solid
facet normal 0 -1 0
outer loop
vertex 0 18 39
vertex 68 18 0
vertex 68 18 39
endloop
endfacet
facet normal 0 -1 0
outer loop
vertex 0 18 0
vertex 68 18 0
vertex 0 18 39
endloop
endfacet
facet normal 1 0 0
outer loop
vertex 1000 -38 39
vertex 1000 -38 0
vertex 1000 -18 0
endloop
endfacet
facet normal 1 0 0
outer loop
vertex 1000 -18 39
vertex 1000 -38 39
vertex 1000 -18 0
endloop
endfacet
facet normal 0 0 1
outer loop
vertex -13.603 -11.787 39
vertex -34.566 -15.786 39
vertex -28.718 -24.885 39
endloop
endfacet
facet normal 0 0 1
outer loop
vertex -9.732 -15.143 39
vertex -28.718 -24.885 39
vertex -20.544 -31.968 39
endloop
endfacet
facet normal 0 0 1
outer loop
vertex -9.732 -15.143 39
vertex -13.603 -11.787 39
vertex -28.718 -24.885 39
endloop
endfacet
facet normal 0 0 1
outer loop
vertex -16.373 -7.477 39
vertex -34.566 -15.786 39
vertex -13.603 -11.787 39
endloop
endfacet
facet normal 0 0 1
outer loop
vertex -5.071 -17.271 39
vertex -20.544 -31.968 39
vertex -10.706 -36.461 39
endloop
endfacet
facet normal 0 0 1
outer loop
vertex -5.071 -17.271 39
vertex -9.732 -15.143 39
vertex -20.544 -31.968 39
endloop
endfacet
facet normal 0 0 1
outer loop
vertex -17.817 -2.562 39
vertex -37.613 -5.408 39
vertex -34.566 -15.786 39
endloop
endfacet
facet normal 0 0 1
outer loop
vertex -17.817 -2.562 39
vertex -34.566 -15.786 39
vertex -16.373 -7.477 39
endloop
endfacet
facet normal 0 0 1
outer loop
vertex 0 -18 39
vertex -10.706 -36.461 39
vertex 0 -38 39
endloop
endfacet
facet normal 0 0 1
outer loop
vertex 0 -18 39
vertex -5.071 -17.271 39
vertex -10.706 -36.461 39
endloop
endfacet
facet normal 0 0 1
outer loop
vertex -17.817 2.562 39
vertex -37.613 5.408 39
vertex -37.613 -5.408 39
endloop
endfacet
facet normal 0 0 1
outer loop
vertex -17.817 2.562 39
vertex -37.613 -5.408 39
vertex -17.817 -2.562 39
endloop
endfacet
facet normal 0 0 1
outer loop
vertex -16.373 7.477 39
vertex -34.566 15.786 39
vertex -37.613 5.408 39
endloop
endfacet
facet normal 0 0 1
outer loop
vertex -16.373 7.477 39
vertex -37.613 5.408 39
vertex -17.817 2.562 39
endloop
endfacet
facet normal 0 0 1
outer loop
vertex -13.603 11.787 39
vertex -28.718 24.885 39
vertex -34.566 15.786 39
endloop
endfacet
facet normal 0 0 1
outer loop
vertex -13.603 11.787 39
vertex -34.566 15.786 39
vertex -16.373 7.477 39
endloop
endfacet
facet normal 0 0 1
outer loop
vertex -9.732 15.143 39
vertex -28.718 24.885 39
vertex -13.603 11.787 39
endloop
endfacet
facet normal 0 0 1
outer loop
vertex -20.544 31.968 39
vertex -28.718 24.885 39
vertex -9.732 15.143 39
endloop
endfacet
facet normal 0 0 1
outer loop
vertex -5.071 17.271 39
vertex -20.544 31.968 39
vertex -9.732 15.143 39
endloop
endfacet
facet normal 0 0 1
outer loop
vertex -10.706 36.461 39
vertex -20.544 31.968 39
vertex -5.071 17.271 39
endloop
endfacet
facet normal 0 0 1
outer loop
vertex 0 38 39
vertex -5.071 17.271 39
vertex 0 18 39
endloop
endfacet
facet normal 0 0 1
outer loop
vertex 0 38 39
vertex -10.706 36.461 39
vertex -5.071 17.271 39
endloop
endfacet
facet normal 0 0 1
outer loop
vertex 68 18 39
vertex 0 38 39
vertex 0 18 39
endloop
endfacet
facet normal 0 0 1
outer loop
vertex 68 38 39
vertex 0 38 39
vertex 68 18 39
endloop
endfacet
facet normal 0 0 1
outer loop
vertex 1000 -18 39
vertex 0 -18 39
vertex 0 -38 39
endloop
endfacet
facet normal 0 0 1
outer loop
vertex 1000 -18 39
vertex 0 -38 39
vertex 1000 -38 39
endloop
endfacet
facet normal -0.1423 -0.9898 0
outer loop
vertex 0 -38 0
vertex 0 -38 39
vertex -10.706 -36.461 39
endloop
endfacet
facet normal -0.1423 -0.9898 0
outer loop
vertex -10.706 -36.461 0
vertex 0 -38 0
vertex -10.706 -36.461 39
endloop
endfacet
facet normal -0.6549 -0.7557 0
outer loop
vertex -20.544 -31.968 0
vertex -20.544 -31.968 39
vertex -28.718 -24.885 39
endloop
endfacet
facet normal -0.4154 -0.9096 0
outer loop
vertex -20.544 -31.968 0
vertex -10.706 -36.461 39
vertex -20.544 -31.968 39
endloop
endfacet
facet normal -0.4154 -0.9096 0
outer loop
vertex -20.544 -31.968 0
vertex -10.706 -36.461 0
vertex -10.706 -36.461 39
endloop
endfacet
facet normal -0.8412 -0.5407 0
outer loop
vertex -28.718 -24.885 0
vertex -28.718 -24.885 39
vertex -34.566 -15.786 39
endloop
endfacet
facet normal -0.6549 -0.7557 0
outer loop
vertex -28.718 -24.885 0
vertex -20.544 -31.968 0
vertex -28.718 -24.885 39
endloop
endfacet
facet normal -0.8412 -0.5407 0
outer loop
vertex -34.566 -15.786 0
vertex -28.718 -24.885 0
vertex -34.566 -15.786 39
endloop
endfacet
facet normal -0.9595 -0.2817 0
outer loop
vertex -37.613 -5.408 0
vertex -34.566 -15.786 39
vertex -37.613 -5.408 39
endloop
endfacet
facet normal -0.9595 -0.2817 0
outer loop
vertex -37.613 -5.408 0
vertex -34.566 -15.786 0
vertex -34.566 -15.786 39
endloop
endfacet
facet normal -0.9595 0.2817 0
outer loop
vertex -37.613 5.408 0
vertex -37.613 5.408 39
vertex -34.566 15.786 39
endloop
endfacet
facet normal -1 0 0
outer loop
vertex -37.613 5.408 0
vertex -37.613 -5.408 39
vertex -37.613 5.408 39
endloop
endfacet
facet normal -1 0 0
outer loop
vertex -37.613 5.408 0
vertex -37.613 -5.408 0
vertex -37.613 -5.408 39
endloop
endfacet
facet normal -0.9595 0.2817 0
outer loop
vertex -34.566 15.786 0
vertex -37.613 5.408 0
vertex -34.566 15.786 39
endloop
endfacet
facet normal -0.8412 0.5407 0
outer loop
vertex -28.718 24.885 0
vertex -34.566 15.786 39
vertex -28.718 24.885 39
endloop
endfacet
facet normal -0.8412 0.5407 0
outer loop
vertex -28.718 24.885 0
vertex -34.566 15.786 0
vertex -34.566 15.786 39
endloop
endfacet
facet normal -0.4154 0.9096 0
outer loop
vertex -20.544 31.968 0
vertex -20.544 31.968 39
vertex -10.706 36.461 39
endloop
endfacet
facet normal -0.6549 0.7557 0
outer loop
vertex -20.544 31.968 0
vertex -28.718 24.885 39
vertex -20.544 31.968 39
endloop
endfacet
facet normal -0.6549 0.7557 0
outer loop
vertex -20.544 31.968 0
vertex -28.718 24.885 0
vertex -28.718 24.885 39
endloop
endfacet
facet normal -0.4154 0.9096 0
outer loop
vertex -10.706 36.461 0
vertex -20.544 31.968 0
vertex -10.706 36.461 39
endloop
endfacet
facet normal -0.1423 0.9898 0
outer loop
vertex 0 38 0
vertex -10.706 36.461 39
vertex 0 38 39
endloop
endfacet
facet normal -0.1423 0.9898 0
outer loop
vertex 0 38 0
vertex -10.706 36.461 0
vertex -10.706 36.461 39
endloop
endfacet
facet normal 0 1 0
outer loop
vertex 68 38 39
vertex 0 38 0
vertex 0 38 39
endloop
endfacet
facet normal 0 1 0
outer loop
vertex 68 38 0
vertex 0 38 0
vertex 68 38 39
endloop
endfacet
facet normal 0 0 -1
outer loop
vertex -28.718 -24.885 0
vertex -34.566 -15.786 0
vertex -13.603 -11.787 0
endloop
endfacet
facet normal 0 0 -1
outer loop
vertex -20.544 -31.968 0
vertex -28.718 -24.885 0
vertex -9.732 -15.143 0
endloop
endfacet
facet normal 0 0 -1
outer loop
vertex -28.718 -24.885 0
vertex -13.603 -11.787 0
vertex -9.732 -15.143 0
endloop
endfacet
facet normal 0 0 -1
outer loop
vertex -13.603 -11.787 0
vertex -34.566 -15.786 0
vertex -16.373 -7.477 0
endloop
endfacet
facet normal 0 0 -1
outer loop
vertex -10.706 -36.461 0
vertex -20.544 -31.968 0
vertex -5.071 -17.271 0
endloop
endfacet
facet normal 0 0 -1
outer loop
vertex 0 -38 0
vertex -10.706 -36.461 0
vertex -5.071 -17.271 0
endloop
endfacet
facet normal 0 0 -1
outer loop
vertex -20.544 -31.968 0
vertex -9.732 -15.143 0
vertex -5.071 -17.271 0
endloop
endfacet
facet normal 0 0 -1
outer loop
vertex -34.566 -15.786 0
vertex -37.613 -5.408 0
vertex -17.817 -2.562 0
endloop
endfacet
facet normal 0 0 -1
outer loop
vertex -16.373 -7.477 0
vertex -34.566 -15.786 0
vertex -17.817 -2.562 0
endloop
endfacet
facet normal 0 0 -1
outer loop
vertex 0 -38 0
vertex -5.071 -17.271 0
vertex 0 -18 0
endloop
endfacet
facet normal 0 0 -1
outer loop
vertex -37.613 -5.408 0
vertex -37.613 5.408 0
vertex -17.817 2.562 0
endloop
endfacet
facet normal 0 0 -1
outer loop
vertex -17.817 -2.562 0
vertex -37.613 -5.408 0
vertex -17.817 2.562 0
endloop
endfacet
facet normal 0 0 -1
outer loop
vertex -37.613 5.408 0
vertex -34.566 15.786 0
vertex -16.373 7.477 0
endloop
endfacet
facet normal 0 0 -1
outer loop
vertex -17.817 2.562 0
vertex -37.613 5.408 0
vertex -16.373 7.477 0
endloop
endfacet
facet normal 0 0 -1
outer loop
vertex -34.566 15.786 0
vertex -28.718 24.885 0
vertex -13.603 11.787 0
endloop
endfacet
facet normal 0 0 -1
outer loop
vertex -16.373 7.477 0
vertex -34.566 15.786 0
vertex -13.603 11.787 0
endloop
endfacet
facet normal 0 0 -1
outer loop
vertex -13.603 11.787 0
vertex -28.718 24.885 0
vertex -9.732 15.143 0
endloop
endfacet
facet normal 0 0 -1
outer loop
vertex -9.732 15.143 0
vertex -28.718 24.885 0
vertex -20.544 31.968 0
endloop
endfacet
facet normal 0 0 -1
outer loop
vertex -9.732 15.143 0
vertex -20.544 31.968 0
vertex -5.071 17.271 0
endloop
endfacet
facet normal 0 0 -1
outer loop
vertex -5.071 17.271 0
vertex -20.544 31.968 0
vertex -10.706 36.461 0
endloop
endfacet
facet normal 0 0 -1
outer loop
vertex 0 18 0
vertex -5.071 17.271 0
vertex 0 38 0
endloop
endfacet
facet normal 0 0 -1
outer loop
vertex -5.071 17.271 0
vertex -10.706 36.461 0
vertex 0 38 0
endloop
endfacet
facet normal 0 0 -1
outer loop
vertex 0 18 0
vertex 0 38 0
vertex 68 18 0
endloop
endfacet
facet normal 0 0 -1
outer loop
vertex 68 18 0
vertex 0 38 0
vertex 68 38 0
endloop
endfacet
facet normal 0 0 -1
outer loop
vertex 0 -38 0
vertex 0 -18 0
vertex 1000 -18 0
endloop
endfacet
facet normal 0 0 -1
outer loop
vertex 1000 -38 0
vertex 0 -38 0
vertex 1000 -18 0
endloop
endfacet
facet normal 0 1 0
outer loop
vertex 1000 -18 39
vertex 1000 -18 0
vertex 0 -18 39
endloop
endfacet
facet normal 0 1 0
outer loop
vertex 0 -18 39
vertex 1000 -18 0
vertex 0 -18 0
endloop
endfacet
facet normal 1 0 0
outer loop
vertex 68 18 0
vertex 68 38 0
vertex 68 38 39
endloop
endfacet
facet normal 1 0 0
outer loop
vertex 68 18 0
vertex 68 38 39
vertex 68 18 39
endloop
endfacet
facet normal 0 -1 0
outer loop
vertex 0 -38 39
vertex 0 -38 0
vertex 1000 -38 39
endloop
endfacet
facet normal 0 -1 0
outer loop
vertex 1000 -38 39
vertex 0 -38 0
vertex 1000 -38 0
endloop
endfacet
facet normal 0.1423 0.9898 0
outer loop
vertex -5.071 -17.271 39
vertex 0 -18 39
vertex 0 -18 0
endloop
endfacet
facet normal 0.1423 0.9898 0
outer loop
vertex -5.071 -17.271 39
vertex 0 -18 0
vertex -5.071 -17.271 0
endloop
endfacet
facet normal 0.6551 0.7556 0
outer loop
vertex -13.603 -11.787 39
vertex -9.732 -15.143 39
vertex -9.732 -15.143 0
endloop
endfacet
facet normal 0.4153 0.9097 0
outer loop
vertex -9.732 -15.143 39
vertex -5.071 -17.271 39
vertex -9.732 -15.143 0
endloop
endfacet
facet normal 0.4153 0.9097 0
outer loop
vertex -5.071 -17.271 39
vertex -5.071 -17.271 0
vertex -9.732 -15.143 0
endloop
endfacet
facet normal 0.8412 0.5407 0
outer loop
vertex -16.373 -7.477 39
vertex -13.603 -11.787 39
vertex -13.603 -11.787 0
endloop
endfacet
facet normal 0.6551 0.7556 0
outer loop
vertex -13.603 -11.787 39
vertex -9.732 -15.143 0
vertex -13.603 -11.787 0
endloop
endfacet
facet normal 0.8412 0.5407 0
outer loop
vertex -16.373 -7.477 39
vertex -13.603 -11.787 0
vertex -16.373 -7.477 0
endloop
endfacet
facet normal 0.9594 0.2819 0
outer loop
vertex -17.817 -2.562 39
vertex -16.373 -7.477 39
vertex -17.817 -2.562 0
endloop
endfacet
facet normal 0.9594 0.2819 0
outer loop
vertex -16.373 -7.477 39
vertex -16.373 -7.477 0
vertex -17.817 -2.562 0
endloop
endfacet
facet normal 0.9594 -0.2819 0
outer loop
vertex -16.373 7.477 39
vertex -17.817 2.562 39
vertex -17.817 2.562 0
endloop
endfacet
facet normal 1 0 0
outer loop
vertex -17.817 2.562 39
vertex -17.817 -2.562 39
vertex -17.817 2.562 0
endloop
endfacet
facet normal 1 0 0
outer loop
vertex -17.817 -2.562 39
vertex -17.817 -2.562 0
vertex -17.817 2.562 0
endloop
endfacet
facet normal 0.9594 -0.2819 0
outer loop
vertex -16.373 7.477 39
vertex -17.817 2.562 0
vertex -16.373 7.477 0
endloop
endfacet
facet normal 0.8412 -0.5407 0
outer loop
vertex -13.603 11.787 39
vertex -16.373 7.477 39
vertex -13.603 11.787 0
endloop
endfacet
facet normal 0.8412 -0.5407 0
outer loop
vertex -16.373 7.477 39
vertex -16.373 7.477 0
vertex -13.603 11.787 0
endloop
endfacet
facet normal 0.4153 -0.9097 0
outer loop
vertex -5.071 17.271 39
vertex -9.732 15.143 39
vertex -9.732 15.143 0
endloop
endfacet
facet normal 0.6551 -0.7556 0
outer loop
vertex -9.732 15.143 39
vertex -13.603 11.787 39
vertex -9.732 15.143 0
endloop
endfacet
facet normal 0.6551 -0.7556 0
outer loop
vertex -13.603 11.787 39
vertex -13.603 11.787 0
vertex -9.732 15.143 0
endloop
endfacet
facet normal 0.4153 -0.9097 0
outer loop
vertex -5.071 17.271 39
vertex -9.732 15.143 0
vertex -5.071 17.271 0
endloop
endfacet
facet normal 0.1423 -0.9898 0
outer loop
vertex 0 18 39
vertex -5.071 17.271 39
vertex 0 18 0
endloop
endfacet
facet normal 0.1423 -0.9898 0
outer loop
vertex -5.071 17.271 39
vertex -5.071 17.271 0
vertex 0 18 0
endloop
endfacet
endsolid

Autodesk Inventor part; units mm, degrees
ref_plane "YZ Plane" through (0, 0, 0) normal (1, 0, 0) x (0, 1, 0)
ref_plane "XZ Plane" through (0, 0, 0) normal (0, 1, 0) x (-1, 0, 0)
ref_plane "XY Plane" through (0, 0, 0) normal (0, 0, 1) x (1, 0, 0)
sketch "Sketch1" plane through (0, 0, 0) normal (0, 0, 1) x (1, 0, 0)
  circle A0 centre (0, 0) radius 38
  line L0 (0, -38) -> (1000, -38)
  line L1 (1000, -38) -> (1000, -18)
  line L2 (1000, -18) -> (0, -18)
  line L3 (0, -18) -> (0, -38)
  line L4 (0, 38) -> (68, 38)
  line L5 (68, 38) -> (68, 18)
  line L6 (68, 18) -> (0, 18)
  line L7 (0, 18) -> (0, 38)
  circle A1 centre (0, 0) radius 18
  dimension "d0" = 76
  dimension "d1" = 20
  dimension "d2" = 20
  dimension "d4" = 1000
  dimension "d7" = 68
extrude "Extrusion1" add sketch "Sketch1" along normal blind 39 contours L7 A1 L3 A0 | L4 L5 L6 A0 | A0 L6 L7 | L3 L2 A0 | A0 L2 L1 L0
properties part number "J15BF.1.30"
